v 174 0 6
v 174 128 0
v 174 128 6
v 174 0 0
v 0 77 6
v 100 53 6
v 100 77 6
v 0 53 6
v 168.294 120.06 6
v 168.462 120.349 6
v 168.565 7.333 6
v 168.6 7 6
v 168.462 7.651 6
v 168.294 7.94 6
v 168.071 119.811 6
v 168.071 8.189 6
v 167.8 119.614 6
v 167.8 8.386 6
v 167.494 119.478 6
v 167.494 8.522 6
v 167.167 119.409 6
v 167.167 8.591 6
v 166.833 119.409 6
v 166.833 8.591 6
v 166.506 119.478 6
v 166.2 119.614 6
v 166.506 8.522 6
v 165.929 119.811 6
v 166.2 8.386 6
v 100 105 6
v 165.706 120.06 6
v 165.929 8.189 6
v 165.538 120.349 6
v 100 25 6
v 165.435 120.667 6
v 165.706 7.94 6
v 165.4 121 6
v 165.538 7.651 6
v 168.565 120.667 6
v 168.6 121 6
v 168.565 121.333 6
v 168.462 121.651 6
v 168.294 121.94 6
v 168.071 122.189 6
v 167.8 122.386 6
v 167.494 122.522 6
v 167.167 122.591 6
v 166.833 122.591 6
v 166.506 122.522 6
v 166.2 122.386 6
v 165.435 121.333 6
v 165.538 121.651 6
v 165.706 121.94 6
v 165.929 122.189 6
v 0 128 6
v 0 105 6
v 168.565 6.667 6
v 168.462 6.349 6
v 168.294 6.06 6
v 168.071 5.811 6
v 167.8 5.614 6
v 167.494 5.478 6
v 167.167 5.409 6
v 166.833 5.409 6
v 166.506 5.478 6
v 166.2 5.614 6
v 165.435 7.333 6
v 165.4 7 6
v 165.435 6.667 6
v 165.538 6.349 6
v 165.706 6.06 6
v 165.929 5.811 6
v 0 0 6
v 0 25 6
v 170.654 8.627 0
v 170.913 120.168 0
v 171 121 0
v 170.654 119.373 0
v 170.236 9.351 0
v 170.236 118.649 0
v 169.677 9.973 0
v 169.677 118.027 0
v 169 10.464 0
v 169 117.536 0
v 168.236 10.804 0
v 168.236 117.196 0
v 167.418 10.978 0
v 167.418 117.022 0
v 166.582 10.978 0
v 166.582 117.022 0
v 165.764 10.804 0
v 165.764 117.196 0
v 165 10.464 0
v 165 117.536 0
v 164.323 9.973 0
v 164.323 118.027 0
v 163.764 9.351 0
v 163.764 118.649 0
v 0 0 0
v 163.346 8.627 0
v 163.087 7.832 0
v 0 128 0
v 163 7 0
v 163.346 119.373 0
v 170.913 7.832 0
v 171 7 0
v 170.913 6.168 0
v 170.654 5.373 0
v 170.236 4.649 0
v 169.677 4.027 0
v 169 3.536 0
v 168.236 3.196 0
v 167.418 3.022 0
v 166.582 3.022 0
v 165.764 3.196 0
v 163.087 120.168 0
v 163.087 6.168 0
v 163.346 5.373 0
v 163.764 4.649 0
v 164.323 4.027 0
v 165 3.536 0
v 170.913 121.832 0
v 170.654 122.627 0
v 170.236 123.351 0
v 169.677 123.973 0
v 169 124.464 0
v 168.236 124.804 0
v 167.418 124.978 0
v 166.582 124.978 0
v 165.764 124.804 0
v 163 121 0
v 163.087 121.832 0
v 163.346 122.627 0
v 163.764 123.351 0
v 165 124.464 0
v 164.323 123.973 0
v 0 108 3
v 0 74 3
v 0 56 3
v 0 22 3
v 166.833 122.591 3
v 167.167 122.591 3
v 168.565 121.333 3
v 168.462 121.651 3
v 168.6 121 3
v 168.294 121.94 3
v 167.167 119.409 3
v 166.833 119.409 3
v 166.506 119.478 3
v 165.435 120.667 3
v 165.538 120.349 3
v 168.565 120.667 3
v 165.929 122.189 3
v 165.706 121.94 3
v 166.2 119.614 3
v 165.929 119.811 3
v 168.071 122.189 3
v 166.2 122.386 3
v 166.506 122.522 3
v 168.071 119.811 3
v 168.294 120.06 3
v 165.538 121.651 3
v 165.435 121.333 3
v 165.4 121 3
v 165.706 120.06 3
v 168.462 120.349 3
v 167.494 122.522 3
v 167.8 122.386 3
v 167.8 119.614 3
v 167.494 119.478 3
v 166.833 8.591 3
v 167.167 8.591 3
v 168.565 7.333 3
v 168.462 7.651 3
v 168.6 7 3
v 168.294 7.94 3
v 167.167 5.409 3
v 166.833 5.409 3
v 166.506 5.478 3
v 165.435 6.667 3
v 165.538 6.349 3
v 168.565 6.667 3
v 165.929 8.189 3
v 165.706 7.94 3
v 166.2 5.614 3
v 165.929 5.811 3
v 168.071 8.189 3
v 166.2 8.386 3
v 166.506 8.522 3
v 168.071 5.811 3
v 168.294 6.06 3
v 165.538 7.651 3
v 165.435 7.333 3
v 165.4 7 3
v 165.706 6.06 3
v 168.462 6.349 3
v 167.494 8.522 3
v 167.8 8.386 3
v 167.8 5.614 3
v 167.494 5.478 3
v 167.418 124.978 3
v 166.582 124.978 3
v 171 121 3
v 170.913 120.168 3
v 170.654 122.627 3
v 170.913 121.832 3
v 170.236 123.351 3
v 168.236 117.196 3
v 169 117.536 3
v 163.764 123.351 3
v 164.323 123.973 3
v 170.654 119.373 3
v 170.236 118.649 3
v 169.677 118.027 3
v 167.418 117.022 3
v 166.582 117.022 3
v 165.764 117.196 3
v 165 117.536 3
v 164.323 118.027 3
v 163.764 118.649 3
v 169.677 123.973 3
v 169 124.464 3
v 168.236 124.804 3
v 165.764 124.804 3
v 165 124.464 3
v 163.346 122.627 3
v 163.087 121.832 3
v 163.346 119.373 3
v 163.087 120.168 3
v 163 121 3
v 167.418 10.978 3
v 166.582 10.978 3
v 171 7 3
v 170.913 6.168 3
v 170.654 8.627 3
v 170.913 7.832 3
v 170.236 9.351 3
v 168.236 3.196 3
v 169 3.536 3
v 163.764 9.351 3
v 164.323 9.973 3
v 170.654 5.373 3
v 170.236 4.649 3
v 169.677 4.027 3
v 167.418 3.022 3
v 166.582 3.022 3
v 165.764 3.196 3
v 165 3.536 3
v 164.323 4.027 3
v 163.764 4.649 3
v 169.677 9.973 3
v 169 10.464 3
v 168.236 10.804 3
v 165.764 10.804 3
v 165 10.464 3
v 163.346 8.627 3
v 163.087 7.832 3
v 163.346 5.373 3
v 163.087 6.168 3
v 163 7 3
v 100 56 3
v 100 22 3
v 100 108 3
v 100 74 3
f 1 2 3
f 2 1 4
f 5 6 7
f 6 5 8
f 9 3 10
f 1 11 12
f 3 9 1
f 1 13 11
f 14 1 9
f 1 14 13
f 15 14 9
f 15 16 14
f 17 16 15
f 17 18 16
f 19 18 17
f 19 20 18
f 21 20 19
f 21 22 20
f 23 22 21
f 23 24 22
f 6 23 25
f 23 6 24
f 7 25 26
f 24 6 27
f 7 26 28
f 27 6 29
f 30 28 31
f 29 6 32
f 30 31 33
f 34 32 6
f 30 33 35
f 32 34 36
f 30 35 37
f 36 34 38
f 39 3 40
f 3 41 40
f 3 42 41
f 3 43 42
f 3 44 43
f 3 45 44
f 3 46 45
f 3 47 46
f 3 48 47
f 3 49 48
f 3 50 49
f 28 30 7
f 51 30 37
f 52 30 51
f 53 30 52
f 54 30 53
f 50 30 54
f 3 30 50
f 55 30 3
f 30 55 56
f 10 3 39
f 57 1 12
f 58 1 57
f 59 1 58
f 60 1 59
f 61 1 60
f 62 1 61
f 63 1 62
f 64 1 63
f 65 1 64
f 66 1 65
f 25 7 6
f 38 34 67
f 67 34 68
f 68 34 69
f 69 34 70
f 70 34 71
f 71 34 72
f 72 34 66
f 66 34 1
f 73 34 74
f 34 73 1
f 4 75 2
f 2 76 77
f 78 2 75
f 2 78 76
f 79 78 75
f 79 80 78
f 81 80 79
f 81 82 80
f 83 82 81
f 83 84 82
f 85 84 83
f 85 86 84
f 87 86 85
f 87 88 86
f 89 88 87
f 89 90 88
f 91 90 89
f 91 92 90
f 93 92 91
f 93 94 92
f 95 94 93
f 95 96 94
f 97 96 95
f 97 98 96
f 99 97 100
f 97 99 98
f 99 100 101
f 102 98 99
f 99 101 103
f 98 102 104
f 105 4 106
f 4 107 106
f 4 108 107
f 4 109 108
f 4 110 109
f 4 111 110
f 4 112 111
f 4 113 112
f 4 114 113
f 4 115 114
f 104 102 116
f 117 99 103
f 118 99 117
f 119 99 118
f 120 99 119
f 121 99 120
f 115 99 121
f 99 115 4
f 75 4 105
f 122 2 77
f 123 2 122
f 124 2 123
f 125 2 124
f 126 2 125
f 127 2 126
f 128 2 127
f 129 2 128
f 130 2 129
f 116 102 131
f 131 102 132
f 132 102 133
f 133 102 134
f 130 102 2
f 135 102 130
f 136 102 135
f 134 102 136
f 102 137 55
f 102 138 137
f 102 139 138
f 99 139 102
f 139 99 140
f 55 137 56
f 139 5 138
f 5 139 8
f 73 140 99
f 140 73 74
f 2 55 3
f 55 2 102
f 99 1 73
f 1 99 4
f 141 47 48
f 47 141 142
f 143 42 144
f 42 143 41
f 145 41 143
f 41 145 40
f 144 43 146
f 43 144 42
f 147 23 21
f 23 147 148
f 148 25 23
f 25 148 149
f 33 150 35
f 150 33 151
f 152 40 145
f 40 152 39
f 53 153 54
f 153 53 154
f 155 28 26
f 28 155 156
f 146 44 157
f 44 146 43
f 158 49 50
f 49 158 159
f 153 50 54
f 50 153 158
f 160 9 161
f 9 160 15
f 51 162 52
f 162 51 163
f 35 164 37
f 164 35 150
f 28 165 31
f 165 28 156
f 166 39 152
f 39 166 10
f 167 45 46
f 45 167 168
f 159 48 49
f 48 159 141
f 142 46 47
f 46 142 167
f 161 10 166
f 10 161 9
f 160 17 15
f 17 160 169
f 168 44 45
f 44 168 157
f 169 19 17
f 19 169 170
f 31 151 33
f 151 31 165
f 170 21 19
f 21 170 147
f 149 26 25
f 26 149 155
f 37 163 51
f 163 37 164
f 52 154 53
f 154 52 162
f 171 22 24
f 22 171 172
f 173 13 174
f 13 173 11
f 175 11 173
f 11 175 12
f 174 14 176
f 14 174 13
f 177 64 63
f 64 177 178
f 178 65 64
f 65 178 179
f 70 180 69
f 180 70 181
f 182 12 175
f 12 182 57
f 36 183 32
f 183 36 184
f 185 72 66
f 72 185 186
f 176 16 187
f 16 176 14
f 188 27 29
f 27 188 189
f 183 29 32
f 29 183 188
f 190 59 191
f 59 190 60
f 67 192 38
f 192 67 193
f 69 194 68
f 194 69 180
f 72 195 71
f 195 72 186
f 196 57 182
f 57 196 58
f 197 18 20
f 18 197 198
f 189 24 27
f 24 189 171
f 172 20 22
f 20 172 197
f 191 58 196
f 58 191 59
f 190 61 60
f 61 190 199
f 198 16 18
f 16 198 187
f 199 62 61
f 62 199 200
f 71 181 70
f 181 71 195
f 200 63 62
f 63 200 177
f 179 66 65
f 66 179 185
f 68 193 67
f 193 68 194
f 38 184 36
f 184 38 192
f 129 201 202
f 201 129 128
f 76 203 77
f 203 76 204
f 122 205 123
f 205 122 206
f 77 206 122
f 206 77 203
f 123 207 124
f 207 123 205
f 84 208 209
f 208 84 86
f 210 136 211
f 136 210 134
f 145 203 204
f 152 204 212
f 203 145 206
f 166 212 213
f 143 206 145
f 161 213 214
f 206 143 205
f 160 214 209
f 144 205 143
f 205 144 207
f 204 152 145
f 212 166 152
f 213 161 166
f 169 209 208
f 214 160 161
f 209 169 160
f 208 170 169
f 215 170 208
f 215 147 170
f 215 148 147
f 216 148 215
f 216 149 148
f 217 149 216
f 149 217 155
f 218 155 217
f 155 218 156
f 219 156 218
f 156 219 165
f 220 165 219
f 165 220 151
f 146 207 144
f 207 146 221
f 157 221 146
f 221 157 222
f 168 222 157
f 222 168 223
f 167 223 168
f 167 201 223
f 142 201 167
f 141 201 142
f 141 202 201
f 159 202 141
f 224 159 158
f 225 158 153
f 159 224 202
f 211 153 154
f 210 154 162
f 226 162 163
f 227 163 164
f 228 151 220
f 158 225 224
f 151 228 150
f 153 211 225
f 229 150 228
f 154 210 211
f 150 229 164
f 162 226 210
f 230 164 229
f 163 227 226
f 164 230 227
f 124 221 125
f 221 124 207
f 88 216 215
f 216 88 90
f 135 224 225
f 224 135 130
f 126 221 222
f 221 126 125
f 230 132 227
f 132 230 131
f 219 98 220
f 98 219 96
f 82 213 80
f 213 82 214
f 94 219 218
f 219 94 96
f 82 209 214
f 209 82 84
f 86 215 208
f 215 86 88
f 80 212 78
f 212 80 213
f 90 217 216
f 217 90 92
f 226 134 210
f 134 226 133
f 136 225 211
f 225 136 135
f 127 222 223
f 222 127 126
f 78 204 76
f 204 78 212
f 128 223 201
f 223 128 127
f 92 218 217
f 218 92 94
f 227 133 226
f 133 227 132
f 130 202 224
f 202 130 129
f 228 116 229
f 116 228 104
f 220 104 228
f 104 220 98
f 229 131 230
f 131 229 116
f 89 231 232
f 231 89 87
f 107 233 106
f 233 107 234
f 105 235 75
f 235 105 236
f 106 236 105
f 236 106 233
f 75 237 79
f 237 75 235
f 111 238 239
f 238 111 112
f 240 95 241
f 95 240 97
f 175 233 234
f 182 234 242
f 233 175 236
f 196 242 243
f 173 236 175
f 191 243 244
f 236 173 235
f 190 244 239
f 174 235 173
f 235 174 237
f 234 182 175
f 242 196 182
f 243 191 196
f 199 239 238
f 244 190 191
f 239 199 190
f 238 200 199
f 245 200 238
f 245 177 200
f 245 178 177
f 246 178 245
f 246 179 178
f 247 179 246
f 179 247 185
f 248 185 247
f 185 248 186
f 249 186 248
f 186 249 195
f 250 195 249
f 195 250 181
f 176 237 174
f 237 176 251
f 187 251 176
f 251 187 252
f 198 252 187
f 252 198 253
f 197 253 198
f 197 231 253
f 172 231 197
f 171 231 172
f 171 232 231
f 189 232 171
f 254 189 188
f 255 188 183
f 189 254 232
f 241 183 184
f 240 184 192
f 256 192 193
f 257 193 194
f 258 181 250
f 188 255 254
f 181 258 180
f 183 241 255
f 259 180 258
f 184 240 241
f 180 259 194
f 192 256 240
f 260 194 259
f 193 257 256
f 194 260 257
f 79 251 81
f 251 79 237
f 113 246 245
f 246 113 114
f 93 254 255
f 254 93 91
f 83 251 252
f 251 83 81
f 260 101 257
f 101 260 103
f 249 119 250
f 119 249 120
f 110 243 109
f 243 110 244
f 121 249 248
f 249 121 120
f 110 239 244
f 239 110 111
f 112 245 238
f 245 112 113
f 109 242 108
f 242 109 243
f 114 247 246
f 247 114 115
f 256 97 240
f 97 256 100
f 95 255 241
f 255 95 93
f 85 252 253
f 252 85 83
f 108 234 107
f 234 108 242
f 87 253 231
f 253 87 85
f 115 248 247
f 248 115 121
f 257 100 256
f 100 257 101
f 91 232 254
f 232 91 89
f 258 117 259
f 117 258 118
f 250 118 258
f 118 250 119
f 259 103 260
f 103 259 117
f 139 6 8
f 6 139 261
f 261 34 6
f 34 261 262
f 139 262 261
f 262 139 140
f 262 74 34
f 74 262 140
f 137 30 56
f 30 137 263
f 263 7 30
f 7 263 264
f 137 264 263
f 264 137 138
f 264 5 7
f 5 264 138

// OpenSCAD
// file: wedge.scad
module wedge(width = 60) {
    rotate([270, 0, 90]) linear_extrude(height=200)
    polygon(points=[[4, 0], [width, 0], [width + 4, 4], [0, 4]]);
}

wedge();
// main file
use <wedge.scad>;

difference() {
    cube([174, 128, 6]);
    translate([167, 121, 0]) cylinder(h = 7, r = 1.6, $fn = 30);
    translate([167, 7, 0]) cylinder(h = 7, r = 1.6, $fn = 30);

    translate([167, 121, 0]) cylinder(h = 3, r = 4, $fn = 30);
    translate([167, 7, 0]) cylinder(h = 3, r = 4, $fn = 30);
    translate([100, ((128 / 4) * 1) - 10, 7]) color("Green") wedge(width = 30);
    translate([100, ((128 / 4) * 2) + 10, 7]) color("Green") wedge(width = 30);
}
